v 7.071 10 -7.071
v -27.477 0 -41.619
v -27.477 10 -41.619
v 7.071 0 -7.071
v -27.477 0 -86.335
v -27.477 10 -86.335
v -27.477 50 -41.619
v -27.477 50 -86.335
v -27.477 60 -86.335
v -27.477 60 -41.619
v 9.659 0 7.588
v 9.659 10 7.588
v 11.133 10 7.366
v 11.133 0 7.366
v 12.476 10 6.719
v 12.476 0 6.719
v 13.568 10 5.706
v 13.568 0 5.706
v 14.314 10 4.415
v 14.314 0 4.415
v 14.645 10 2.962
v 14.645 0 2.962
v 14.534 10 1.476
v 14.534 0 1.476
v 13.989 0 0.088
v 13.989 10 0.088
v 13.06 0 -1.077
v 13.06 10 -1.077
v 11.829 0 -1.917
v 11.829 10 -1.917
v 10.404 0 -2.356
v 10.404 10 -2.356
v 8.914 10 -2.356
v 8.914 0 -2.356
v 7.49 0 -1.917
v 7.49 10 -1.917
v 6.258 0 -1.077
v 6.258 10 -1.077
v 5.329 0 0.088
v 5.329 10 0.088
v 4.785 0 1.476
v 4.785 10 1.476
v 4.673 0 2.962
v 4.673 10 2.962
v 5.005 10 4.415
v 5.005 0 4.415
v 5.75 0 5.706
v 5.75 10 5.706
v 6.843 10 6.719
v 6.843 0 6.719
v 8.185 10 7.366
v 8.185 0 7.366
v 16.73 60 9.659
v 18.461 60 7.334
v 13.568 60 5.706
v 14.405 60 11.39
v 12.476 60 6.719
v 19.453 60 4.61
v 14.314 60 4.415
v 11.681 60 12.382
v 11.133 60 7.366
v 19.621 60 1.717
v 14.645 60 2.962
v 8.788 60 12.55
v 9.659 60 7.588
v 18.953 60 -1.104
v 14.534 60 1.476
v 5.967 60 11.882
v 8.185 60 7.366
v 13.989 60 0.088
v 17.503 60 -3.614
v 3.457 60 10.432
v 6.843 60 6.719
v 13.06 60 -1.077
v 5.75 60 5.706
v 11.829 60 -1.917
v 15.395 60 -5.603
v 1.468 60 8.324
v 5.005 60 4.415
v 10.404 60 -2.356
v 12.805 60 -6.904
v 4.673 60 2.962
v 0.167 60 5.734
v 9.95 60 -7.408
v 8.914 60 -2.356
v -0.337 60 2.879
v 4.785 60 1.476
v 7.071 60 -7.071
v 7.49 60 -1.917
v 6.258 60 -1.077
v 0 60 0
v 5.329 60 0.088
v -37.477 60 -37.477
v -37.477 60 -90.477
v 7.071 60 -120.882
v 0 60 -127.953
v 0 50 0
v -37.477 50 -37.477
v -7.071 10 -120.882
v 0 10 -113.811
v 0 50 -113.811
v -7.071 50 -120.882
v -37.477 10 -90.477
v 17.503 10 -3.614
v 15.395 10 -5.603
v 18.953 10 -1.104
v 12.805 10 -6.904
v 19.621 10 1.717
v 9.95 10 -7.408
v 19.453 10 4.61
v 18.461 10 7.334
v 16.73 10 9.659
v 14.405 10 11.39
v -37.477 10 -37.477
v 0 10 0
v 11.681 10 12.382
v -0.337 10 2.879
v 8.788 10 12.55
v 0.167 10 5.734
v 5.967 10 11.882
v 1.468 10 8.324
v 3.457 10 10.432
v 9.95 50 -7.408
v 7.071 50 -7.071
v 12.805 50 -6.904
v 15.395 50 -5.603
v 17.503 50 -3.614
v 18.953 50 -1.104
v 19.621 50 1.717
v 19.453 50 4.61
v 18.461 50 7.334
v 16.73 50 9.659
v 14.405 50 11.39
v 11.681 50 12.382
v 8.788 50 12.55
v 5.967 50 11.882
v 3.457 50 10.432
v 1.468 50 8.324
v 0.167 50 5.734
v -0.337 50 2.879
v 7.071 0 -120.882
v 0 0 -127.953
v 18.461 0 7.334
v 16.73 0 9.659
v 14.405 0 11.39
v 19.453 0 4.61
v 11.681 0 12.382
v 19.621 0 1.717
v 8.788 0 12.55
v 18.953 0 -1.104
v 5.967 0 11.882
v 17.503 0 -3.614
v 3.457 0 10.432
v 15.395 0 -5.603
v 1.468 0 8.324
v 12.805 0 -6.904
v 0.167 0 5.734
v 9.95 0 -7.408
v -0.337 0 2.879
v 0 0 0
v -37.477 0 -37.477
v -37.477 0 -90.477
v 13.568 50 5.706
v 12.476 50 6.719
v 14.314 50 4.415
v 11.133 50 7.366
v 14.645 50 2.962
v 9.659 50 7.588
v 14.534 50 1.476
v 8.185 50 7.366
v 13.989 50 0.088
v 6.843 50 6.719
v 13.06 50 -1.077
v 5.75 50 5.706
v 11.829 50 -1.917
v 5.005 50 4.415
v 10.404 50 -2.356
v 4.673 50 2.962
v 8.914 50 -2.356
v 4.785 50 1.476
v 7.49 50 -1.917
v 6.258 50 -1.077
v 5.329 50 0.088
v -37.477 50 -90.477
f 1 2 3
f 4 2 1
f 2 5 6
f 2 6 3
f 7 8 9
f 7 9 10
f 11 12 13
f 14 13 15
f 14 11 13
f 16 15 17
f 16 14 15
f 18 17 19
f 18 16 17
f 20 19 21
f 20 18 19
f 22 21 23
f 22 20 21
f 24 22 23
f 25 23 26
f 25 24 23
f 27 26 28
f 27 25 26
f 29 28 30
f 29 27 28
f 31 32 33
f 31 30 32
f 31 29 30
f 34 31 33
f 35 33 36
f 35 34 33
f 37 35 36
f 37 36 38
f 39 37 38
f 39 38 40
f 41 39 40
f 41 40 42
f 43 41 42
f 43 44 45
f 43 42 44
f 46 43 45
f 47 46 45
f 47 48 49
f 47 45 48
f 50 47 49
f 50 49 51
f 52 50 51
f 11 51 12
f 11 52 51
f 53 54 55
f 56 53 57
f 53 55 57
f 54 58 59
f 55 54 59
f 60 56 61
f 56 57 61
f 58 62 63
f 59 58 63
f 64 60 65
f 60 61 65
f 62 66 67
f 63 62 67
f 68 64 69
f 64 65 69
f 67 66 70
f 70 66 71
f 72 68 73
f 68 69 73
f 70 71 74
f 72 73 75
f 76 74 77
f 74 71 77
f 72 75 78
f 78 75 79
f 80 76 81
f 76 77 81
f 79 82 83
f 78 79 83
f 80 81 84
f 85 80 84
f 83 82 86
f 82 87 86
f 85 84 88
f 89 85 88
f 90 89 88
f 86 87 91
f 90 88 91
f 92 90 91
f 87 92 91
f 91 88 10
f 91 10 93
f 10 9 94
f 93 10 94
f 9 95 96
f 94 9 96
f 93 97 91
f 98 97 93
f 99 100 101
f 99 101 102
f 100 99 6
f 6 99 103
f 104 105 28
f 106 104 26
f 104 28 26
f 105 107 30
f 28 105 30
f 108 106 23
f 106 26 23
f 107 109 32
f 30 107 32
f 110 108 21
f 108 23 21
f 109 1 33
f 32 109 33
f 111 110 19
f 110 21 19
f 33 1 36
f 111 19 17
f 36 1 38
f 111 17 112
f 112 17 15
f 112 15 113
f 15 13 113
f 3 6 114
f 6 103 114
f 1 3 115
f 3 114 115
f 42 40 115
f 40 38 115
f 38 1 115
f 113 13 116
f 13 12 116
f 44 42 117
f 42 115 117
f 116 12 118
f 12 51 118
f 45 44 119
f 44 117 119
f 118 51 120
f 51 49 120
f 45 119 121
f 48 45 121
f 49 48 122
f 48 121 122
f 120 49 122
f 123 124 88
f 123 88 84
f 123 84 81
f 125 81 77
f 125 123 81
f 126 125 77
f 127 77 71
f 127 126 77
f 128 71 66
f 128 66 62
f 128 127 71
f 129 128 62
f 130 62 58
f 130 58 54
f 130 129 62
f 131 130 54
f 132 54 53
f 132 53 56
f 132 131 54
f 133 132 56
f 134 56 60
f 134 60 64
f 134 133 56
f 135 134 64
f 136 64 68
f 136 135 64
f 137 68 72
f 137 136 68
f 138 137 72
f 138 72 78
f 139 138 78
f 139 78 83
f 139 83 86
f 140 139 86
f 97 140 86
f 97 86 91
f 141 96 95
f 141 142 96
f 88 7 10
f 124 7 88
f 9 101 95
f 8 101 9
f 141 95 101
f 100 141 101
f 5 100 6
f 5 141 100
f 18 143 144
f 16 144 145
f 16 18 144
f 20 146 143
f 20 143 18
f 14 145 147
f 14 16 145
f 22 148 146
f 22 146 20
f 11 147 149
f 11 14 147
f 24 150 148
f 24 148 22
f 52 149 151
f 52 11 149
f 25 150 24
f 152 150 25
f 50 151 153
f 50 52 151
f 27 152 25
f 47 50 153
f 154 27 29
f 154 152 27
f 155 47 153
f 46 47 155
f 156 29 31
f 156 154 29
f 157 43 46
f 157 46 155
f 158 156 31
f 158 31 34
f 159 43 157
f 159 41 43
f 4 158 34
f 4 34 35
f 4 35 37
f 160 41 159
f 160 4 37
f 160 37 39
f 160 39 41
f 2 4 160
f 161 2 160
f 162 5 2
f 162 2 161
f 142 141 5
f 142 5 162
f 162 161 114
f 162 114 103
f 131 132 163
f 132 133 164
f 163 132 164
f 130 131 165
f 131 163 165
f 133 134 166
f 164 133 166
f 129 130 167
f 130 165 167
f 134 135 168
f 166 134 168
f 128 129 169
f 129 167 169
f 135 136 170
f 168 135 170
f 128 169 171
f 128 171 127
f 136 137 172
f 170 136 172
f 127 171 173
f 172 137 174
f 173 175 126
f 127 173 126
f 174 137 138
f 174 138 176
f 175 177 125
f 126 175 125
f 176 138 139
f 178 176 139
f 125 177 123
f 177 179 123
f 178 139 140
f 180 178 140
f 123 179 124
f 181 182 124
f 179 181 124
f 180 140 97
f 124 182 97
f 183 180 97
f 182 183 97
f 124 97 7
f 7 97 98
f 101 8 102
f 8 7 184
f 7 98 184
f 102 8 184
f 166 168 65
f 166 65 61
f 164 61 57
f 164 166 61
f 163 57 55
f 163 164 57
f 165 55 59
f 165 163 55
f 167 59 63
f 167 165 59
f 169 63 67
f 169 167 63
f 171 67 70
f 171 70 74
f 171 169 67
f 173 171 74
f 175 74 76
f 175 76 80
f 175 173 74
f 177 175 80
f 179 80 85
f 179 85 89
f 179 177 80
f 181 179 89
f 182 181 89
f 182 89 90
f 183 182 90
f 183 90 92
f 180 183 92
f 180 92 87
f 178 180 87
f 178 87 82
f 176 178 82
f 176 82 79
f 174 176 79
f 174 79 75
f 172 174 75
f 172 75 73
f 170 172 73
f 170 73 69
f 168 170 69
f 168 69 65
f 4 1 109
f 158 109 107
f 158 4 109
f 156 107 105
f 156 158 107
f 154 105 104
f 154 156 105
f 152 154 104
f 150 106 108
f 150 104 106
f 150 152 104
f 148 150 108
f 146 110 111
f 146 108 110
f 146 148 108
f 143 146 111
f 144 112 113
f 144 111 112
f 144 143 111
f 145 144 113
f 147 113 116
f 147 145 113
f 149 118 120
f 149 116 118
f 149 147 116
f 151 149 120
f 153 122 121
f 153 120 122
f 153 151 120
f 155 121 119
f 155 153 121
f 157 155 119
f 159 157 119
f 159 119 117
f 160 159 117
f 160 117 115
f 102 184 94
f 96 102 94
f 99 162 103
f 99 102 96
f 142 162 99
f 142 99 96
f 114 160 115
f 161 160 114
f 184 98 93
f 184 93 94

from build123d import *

# Parameters (mm, degrees)
SKETCH_1_R          = 5
EXTRUDE_1_DEPTH     = 60
SKETCH_3_W          = 37.476659403
SKETCH_3_H          = 40
SKETCH_3_W_2        = 53
SKETCH_3_W_3        = 50.064849854
CUT_EXTRUDE_1_DEPTH = 58
EXTRUDE_2_DEPTH     = 40


with BuildPart() as part:
    # 草图1 → 凸台-拉伸1 (new body)
    with BuildSketch(Plane(origin=(0, 0, 0), x_dir=(1, 0, 0), z_dir=(0, 1, 0))):
        with BuildLine():
            Line((0, 0), (-37.476659403, 37.476659403))
            Line((-37.476659403, 37.476659403), (-37.476659403, 90.476659403))
            Line((-37.476659403, 90.476659403), (0, 127.953318806))
            Line((0, 127.953318806), (7.071067812, 120.882250994))
            Line((7.071067812, 120.882250994), (-27.476659403, 86.334523779))
            Line((-27.476659403, 86.334523779), (-27.476659403, 41.618795027))
            Line((-27.476659403, 41.618795027), (7.071067812, 7.071067812))
            ThreePointArc((7.071067812, 7.071067812), (16.730326075, -9.659258263), (0, 0))
        make_face()
        with Locations(Location((9.659258263, -2.588190451, 0), (0, 0, 270))):
            Circle(SKETCH_1_R, mode=Mode.SUBTRACT)
    extrude(amount=EXTRUDE_1_DEPTH)

    # 草图3 → 切除-拉伸1 (cut)
    with BuildSketch(Plane.ZY.offset(37.476659403)):
        with Locations((-109.214989105, 30)):
            Rectangle(SKETCH_3_W, SKETCH_3_H)
        with Locations((-63.976659403, 30)):
            Rectangle(SKETCH_3_W_2, SKETCH_3_H)
        with Locations((-12.444234476, 30)):
            Rectangle(SKETCH_3_W_3, SKETCH_3_H)
    extrude(amount=-CUT_EXTRUDE_1_DEPTH, mode=Mode.SUBTRACT)


with BuildPart() as cut_extrude_1_piece_1:
    # of the separate pieces the step leaves, piece 1, a body of its own (cut_extrude_1_pieces)
    add(part.part.solids().sort_by_distance((7.071067812, 0, -7.071067812))[0])



with BuildPart() as cut_extrude_1_piece_2:
    # of the separate pieces the step leaves, piece 2, a body of its own (cut_extrude_1_pieces)
    add(part.part.solids().sort_by_distance((0, 50, 0))[0])


with BuildPart() as cut_extrude_1_piece_1_1:
    add(cut_extrude_1_piece_1.part)

    add(cut_extrude_1_piece_2.part)  # 凸台-拉伸2 merges 切除-拉伸1 piece 2
    # 草图4 → 凸台-拉伸2 (add)
    with BuildSketch(Plane(origin=(0, 10, 0), x_dir=(1, 0, 0), z_dir=(0, 1, 0))):
        Polygon((0, 127.953318806), (7.071067812, 120.882250994), (0, 113.811183182), (-7.071067812, 120.882250994), align=None)
    extrude(amount=EXTRUDE_2_DEPTH)


solid = cut_extrude_1_piece_1_1.part
